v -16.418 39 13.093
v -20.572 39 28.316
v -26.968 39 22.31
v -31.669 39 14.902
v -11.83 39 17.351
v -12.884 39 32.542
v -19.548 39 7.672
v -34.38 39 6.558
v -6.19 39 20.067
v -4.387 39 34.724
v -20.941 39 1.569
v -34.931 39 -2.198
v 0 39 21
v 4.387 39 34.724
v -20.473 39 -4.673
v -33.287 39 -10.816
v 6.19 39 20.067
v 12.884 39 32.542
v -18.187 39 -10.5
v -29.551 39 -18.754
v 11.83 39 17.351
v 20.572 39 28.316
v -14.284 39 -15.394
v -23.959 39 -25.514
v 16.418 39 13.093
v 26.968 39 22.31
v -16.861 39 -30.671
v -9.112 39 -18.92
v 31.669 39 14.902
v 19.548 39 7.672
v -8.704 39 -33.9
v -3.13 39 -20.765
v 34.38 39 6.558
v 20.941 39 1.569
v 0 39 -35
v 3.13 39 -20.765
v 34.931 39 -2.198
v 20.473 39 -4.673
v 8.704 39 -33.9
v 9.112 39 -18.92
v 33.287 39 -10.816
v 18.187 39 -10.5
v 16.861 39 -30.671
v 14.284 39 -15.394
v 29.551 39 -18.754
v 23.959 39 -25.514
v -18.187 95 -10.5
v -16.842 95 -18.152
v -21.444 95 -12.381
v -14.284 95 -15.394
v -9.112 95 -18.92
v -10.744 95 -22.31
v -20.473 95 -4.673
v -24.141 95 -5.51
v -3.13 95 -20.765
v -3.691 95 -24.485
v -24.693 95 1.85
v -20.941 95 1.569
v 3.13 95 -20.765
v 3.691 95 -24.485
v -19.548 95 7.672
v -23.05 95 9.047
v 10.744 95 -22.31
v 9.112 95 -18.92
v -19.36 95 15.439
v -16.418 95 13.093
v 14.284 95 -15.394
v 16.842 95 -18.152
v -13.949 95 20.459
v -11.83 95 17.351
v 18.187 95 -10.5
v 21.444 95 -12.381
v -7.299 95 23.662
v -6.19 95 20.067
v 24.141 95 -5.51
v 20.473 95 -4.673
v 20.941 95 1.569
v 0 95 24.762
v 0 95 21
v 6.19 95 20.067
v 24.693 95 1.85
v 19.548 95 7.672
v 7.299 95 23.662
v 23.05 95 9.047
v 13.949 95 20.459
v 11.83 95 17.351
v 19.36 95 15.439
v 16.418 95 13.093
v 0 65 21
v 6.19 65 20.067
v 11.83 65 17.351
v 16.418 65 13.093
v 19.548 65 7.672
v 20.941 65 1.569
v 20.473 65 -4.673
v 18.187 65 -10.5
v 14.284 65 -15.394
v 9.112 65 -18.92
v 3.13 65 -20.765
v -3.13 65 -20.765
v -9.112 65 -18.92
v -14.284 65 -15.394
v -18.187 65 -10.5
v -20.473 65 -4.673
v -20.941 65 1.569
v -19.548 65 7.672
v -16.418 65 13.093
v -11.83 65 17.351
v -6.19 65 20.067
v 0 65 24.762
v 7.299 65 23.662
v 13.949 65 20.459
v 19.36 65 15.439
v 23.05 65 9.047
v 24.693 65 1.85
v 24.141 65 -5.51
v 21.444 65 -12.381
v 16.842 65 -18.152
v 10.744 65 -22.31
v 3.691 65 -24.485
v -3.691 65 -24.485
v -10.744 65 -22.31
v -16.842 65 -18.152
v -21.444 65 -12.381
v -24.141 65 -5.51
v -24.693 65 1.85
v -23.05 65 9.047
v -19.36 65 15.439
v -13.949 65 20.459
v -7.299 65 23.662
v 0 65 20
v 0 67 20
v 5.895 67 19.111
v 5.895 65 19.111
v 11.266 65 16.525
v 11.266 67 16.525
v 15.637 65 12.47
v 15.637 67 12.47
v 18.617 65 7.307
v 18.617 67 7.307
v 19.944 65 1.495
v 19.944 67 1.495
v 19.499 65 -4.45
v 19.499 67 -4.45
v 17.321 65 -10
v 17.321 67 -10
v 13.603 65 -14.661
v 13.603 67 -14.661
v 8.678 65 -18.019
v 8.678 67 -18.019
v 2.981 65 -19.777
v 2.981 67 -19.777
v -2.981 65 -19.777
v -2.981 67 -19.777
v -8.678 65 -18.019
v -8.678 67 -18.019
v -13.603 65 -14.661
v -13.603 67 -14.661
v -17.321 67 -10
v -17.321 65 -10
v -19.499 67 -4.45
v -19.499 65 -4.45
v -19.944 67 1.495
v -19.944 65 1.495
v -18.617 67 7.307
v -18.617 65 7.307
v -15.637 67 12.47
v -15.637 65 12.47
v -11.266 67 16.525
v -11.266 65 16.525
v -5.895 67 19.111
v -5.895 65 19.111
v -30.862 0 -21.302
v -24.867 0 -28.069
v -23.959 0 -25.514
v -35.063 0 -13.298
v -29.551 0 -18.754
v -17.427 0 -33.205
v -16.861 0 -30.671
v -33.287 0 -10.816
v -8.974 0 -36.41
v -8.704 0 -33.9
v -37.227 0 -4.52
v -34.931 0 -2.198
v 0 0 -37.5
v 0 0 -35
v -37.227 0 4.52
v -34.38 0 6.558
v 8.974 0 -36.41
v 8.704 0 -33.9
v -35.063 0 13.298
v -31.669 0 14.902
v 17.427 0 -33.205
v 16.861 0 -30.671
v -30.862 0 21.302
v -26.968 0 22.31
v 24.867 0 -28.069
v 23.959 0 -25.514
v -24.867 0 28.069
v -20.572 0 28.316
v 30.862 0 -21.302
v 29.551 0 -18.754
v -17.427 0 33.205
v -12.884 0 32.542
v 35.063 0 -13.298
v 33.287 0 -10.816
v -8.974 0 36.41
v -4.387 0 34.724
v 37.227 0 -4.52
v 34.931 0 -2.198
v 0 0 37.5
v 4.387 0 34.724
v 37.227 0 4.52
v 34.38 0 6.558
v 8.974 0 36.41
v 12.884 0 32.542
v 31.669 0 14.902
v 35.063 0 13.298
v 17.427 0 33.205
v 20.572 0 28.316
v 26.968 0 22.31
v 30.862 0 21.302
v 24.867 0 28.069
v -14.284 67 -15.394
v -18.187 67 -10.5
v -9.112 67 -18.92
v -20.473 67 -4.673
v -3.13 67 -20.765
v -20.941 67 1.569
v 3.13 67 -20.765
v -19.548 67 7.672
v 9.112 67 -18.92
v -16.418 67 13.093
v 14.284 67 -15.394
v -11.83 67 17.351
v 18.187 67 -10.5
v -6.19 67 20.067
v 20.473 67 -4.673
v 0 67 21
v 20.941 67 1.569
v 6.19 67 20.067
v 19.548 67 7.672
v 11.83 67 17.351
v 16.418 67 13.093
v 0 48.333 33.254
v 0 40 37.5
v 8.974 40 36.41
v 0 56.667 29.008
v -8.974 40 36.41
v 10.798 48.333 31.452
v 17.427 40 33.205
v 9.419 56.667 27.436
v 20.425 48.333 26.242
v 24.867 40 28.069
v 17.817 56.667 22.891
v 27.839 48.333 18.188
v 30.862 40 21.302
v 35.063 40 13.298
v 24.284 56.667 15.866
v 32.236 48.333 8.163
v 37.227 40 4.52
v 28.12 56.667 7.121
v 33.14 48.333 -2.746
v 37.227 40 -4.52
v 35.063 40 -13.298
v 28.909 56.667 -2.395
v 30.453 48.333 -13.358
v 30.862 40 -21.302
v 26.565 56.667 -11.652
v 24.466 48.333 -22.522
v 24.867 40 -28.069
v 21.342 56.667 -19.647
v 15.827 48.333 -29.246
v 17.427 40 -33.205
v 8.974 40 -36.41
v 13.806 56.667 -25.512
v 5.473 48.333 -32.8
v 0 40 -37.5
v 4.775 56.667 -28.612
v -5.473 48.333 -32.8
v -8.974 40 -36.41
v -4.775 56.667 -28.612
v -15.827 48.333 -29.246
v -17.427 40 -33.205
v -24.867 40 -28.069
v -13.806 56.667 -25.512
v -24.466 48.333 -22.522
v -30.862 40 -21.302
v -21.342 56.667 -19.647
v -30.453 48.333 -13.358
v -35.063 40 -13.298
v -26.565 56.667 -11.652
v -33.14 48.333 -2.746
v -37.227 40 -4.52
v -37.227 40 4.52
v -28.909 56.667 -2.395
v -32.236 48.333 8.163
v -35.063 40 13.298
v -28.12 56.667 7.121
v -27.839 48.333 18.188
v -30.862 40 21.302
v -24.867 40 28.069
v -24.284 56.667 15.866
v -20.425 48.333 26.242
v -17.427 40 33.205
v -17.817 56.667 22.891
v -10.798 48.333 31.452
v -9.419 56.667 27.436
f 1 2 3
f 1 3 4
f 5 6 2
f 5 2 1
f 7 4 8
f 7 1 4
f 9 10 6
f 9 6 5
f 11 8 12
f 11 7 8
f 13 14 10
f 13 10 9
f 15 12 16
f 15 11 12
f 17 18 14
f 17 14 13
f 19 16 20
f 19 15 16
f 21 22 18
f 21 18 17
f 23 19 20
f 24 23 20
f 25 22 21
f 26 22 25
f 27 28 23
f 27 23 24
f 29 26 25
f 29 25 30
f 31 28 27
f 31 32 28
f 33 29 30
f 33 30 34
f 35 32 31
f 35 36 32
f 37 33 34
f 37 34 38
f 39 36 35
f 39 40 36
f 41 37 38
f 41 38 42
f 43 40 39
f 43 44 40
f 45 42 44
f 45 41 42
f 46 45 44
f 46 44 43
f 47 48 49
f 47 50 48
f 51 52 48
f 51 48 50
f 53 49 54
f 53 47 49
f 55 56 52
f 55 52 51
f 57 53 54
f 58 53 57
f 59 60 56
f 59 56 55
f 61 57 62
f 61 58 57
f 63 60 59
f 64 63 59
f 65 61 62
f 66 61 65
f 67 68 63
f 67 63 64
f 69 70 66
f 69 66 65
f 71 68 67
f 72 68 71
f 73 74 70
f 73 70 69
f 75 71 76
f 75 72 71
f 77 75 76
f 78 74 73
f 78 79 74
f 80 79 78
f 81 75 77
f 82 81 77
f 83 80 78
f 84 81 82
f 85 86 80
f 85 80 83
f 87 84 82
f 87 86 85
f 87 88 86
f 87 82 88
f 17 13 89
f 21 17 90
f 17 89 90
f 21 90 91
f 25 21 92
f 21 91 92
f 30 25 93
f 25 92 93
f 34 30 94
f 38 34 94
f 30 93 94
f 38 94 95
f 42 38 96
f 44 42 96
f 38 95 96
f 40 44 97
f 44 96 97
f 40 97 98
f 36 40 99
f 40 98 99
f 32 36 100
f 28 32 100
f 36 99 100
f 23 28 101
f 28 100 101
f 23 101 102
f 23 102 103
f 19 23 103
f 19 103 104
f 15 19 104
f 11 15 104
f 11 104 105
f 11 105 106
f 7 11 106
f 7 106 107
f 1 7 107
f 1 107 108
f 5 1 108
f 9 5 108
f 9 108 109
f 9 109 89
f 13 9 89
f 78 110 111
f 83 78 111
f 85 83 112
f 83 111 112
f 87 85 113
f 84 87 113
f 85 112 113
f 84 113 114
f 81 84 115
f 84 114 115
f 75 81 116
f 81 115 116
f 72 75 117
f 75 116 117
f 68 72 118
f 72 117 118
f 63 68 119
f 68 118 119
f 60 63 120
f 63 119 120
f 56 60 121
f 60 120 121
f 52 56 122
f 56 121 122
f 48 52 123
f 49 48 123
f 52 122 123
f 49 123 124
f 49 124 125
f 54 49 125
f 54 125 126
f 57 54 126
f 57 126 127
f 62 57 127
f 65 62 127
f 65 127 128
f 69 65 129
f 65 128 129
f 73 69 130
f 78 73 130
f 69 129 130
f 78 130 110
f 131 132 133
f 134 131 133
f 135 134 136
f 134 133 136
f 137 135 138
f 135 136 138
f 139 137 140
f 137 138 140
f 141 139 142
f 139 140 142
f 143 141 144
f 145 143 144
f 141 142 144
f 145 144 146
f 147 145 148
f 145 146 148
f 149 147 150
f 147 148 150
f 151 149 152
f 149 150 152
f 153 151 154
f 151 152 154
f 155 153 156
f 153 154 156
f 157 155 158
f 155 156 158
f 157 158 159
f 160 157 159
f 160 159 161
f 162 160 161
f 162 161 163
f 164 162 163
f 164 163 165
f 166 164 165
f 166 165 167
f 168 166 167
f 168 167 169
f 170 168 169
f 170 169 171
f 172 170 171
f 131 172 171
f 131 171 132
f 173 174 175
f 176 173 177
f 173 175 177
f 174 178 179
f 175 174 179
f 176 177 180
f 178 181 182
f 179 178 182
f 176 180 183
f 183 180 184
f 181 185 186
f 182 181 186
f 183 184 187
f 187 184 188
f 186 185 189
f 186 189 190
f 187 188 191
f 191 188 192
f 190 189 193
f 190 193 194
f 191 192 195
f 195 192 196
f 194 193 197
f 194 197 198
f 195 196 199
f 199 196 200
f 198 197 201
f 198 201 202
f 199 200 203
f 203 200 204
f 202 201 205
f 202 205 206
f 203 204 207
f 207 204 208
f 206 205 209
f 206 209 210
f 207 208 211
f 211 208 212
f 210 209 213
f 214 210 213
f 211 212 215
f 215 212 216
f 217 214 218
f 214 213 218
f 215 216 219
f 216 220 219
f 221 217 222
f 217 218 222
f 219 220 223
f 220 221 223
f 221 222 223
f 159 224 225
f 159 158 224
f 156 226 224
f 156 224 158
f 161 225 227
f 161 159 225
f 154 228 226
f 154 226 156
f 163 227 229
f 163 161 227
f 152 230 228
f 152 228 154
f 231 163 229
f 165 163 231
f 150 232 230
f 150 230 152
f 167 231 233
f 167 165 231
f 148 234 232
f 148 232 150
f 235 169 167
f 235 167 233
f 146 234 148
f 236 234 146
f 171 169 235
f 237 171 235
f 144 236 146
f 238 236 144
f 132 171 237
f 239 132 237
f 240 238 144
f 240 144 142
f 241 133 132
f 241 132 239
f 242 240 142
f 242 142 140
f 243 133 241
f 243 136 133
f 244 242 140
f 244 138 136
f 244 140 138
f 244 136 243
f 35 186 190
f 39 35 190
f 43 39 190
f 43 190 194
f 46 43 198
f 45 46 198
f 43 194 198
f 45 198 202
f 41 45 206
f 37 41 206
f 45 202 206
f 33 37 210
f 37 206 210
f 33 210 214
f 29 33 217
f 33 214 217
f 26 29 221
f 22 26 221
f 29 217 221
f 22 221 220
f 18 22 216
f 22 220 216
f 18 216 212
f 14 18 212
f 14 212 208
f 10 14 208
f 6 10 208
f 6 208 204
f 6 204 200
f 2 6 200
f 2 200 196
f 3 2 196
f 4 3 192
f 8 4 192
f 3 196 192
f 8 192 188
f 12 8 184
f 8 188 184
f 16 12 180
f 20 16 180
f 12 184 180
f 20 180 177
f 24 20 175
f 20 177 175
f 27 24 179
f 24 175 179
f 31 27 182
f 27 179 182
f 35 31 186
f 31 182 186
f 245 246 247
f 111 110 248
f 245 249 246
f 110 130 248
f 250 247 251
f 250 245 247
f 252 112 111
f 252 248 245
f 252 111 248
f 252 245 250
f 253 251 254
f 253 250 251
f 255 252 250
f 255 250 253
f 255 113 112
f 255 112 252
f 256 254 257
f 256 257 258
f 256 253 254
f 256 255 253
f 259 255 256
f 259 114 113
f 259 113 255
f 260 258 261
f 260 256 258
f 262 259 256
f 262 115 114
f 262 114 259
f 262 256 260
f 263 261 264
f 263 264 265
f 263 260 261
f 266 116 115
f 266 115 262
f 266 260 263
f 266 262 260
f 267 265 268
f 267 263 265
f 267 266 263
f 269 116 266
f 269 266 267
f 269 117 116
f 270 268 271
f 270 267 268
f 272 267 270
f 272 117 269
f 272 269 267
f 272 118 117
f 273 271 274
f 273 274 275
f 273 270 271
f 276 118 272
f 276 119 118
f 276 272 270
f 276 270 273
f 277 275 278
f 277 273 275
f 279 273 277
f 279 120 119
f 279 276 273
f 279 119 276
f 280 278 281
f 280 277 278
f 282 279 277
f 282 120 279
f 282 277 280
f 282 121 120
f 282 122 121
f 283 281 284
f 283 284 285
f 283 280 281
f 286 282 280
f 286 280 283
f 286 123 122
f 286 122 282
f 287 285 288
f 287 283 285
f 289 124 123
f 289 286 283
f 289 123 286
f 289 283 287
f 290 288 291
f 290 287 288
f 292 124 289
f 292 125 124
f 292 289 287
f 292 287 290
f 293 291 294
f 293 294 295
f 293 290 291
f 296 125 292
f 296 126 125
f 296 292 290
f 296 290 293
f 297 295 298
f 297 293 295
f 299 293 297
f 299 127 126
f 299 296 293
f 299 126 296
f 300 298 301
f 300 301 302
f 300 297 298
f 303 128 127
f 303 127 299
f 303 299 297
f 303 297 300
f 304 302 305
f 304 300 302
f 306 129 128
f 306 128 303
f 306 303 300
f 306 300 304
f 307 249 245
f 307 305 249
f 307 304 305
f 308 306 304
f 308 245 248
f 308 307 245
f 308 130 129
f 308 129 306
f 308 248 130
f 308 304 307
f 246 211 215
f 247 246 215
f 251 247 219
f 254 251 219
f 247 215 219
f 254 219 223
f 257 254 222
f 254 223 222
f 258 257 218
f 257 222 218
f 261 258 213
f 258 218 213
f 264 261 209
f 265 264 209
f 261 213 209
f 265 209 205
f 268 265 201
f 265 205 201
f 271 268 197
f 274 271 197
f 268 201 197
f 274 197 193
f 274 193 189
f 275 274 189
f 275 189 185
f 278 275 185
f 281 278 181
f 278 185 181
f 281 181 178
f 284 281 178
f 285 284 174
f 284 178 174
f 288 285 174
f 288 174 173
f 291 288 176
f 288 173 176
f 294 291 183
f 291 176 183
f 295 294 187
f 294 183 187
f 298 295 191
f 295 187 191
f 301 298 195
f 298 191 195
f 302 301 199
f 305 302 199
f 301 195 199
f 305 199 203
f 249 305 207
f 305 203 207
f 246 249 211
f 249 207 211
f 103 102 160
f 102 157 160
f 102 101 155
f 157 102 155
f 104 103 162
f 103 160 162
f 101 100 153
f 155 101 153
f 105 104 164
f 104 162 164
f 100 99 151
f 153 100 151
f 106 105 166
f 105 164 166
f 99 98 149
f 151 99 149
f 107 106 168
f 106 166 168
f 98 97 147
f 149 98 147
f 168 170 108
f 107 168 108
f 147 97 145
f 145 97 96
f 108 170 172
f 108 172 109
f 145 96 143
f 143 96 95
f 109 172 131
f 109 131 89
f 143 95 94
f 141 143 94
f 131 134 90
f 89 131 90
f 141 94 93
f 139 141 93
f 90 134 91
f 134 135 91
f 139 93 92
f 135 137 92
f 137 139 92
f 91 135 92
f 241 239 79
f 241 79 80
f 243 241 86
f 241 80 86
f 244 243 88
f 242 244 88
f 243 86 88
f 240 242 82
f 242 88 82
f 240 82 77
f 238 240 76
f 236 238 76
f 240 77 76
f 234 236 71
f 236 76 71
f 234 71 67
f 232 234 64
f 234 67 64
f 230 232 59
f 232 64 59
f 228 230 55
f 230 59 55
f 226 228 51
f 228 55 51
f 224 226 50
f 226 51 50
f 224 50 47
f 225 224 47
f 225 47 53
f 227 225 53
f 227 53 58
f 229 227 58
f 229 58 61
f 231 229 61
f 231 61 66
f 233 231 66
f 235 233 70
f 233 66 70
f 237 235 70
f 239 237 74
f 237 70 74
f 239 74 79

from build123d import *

# Parameters (mm, degrees)
SKETCH1_R           = 37.5
BOSS_EXTRUDE1_DEPTH = 65
CHAMFER1_SIZE       = 25
CHAMFER1_SIZE2      = 12.738136237
SKETCH3_R           = 21
CUT_EXTRUDE1_DEPTH  = 30
SKETCH4_R           = 35
CUT_EXTRUDE2_DEPTH  = 39
SKETCH5_R           = 24.761863763
BOSS_EXTRUDE3_DEPTH = 30
SKETCH6_R           = 21
CUT_EXTRUDE3_DEPTH  = 28
SKETCH7_R           = 20
CUT_EXTRUDE4_DEPTH  = 30


with BuildPart() as part:
    # Sketch1 → Boss-Extrude1 (new body)
    with BuildSketch(Plane(origin=(0, 0, 0), x_dir=(1, 0, 0), z_dir=(0, 1, 0))):
        with Locations(Location((0, 0, 0), (0, 0, 270))):
            Circle(SKETCH1_R)
    extrude(amount=BOSS_EXTRUDE1_DEPTH)

    # Chamfer1
    chamfer1_edges = [part.edges().sort_by_distance(p)[0] for p in [
        (0, 65, -37.5),
    ]]
    chamfer1_side = [part.faces().sort_by_distance(p)[0] for p in [
        (0, 32.5, -37.5),
    ]]
    chamfer(chamfer1_edges, length=CHAMFER1_SIZE, length2=CHAMFER1_SIZE2, reference=chamfer1_side[0])

    # Sketch3 → Cut-Extrude1 (cut)
    with BuildSketch(Plane(origin=(0, 65, 0), x_dir=(1, 0, 0), z_dir=(0, 1, 0))):
        with Locations(Location((0, 0, 0), (0, 0, 270))):
            Circle(SKETCH3_R)
    extrude(amount=-CUT_EXTRUDE1_DEPTH, mode=Mode.SUBTRACT)

    # Sketch4 → Cut-Extrude2 (cut)
    with BuildSketch(Plane.XZ):
        with Locations(Location((0, 0, 0), (0, 0, 270))):
            Circle(SKETCH4_R)
    extrude(amount=-CUT_EXTRUDE2_DEPTH, mode=Mode.SUBTRACT)

    # Sketch5 → Boss-Extrude3 (add)
    with BuildSketch(Plane(origin=(0, 65, 0), x_dir=(1, 0, 0), z_dir=(0, 1, 0))):
        with Locations(Location((0, 0, 0), (0, 0, 270))):
            Circle(SKETCH5_R)
    extrude(amount=BOSS_EXTRUDE3_DEPTH)

    # Sketch6 → Cut-Extrude3 (cut)
    with BuildSketch(Plane(origin=(0, 95, 0), x_dir=(1, 0, 0), z_dir=(0, 1, 0))):
        with Locations(Location((0, 0, 0), (0, 0, 270))):
            Circle(SKETCH6_R)
    extrude(amount=-CUT_EXTRUDE3_DEPTH, mode=Mode.SUBTRACT)

    # Sketch7 → Cut-Extrude4 (cut)
    with BuildSketch(Plane(origin=(0, 67, 0), x_dir=(1, 0, 0), z_dir=(0, 1, 0))):
        with Locations(Location((0, 0, 0), (0, 0, 270))):
            Circle(SKETCH7_R)
    extrude(amount=-CUT_EXTRUDE4_DEPTH, mode=Mode.SUBTRACT)


solid = part.part
